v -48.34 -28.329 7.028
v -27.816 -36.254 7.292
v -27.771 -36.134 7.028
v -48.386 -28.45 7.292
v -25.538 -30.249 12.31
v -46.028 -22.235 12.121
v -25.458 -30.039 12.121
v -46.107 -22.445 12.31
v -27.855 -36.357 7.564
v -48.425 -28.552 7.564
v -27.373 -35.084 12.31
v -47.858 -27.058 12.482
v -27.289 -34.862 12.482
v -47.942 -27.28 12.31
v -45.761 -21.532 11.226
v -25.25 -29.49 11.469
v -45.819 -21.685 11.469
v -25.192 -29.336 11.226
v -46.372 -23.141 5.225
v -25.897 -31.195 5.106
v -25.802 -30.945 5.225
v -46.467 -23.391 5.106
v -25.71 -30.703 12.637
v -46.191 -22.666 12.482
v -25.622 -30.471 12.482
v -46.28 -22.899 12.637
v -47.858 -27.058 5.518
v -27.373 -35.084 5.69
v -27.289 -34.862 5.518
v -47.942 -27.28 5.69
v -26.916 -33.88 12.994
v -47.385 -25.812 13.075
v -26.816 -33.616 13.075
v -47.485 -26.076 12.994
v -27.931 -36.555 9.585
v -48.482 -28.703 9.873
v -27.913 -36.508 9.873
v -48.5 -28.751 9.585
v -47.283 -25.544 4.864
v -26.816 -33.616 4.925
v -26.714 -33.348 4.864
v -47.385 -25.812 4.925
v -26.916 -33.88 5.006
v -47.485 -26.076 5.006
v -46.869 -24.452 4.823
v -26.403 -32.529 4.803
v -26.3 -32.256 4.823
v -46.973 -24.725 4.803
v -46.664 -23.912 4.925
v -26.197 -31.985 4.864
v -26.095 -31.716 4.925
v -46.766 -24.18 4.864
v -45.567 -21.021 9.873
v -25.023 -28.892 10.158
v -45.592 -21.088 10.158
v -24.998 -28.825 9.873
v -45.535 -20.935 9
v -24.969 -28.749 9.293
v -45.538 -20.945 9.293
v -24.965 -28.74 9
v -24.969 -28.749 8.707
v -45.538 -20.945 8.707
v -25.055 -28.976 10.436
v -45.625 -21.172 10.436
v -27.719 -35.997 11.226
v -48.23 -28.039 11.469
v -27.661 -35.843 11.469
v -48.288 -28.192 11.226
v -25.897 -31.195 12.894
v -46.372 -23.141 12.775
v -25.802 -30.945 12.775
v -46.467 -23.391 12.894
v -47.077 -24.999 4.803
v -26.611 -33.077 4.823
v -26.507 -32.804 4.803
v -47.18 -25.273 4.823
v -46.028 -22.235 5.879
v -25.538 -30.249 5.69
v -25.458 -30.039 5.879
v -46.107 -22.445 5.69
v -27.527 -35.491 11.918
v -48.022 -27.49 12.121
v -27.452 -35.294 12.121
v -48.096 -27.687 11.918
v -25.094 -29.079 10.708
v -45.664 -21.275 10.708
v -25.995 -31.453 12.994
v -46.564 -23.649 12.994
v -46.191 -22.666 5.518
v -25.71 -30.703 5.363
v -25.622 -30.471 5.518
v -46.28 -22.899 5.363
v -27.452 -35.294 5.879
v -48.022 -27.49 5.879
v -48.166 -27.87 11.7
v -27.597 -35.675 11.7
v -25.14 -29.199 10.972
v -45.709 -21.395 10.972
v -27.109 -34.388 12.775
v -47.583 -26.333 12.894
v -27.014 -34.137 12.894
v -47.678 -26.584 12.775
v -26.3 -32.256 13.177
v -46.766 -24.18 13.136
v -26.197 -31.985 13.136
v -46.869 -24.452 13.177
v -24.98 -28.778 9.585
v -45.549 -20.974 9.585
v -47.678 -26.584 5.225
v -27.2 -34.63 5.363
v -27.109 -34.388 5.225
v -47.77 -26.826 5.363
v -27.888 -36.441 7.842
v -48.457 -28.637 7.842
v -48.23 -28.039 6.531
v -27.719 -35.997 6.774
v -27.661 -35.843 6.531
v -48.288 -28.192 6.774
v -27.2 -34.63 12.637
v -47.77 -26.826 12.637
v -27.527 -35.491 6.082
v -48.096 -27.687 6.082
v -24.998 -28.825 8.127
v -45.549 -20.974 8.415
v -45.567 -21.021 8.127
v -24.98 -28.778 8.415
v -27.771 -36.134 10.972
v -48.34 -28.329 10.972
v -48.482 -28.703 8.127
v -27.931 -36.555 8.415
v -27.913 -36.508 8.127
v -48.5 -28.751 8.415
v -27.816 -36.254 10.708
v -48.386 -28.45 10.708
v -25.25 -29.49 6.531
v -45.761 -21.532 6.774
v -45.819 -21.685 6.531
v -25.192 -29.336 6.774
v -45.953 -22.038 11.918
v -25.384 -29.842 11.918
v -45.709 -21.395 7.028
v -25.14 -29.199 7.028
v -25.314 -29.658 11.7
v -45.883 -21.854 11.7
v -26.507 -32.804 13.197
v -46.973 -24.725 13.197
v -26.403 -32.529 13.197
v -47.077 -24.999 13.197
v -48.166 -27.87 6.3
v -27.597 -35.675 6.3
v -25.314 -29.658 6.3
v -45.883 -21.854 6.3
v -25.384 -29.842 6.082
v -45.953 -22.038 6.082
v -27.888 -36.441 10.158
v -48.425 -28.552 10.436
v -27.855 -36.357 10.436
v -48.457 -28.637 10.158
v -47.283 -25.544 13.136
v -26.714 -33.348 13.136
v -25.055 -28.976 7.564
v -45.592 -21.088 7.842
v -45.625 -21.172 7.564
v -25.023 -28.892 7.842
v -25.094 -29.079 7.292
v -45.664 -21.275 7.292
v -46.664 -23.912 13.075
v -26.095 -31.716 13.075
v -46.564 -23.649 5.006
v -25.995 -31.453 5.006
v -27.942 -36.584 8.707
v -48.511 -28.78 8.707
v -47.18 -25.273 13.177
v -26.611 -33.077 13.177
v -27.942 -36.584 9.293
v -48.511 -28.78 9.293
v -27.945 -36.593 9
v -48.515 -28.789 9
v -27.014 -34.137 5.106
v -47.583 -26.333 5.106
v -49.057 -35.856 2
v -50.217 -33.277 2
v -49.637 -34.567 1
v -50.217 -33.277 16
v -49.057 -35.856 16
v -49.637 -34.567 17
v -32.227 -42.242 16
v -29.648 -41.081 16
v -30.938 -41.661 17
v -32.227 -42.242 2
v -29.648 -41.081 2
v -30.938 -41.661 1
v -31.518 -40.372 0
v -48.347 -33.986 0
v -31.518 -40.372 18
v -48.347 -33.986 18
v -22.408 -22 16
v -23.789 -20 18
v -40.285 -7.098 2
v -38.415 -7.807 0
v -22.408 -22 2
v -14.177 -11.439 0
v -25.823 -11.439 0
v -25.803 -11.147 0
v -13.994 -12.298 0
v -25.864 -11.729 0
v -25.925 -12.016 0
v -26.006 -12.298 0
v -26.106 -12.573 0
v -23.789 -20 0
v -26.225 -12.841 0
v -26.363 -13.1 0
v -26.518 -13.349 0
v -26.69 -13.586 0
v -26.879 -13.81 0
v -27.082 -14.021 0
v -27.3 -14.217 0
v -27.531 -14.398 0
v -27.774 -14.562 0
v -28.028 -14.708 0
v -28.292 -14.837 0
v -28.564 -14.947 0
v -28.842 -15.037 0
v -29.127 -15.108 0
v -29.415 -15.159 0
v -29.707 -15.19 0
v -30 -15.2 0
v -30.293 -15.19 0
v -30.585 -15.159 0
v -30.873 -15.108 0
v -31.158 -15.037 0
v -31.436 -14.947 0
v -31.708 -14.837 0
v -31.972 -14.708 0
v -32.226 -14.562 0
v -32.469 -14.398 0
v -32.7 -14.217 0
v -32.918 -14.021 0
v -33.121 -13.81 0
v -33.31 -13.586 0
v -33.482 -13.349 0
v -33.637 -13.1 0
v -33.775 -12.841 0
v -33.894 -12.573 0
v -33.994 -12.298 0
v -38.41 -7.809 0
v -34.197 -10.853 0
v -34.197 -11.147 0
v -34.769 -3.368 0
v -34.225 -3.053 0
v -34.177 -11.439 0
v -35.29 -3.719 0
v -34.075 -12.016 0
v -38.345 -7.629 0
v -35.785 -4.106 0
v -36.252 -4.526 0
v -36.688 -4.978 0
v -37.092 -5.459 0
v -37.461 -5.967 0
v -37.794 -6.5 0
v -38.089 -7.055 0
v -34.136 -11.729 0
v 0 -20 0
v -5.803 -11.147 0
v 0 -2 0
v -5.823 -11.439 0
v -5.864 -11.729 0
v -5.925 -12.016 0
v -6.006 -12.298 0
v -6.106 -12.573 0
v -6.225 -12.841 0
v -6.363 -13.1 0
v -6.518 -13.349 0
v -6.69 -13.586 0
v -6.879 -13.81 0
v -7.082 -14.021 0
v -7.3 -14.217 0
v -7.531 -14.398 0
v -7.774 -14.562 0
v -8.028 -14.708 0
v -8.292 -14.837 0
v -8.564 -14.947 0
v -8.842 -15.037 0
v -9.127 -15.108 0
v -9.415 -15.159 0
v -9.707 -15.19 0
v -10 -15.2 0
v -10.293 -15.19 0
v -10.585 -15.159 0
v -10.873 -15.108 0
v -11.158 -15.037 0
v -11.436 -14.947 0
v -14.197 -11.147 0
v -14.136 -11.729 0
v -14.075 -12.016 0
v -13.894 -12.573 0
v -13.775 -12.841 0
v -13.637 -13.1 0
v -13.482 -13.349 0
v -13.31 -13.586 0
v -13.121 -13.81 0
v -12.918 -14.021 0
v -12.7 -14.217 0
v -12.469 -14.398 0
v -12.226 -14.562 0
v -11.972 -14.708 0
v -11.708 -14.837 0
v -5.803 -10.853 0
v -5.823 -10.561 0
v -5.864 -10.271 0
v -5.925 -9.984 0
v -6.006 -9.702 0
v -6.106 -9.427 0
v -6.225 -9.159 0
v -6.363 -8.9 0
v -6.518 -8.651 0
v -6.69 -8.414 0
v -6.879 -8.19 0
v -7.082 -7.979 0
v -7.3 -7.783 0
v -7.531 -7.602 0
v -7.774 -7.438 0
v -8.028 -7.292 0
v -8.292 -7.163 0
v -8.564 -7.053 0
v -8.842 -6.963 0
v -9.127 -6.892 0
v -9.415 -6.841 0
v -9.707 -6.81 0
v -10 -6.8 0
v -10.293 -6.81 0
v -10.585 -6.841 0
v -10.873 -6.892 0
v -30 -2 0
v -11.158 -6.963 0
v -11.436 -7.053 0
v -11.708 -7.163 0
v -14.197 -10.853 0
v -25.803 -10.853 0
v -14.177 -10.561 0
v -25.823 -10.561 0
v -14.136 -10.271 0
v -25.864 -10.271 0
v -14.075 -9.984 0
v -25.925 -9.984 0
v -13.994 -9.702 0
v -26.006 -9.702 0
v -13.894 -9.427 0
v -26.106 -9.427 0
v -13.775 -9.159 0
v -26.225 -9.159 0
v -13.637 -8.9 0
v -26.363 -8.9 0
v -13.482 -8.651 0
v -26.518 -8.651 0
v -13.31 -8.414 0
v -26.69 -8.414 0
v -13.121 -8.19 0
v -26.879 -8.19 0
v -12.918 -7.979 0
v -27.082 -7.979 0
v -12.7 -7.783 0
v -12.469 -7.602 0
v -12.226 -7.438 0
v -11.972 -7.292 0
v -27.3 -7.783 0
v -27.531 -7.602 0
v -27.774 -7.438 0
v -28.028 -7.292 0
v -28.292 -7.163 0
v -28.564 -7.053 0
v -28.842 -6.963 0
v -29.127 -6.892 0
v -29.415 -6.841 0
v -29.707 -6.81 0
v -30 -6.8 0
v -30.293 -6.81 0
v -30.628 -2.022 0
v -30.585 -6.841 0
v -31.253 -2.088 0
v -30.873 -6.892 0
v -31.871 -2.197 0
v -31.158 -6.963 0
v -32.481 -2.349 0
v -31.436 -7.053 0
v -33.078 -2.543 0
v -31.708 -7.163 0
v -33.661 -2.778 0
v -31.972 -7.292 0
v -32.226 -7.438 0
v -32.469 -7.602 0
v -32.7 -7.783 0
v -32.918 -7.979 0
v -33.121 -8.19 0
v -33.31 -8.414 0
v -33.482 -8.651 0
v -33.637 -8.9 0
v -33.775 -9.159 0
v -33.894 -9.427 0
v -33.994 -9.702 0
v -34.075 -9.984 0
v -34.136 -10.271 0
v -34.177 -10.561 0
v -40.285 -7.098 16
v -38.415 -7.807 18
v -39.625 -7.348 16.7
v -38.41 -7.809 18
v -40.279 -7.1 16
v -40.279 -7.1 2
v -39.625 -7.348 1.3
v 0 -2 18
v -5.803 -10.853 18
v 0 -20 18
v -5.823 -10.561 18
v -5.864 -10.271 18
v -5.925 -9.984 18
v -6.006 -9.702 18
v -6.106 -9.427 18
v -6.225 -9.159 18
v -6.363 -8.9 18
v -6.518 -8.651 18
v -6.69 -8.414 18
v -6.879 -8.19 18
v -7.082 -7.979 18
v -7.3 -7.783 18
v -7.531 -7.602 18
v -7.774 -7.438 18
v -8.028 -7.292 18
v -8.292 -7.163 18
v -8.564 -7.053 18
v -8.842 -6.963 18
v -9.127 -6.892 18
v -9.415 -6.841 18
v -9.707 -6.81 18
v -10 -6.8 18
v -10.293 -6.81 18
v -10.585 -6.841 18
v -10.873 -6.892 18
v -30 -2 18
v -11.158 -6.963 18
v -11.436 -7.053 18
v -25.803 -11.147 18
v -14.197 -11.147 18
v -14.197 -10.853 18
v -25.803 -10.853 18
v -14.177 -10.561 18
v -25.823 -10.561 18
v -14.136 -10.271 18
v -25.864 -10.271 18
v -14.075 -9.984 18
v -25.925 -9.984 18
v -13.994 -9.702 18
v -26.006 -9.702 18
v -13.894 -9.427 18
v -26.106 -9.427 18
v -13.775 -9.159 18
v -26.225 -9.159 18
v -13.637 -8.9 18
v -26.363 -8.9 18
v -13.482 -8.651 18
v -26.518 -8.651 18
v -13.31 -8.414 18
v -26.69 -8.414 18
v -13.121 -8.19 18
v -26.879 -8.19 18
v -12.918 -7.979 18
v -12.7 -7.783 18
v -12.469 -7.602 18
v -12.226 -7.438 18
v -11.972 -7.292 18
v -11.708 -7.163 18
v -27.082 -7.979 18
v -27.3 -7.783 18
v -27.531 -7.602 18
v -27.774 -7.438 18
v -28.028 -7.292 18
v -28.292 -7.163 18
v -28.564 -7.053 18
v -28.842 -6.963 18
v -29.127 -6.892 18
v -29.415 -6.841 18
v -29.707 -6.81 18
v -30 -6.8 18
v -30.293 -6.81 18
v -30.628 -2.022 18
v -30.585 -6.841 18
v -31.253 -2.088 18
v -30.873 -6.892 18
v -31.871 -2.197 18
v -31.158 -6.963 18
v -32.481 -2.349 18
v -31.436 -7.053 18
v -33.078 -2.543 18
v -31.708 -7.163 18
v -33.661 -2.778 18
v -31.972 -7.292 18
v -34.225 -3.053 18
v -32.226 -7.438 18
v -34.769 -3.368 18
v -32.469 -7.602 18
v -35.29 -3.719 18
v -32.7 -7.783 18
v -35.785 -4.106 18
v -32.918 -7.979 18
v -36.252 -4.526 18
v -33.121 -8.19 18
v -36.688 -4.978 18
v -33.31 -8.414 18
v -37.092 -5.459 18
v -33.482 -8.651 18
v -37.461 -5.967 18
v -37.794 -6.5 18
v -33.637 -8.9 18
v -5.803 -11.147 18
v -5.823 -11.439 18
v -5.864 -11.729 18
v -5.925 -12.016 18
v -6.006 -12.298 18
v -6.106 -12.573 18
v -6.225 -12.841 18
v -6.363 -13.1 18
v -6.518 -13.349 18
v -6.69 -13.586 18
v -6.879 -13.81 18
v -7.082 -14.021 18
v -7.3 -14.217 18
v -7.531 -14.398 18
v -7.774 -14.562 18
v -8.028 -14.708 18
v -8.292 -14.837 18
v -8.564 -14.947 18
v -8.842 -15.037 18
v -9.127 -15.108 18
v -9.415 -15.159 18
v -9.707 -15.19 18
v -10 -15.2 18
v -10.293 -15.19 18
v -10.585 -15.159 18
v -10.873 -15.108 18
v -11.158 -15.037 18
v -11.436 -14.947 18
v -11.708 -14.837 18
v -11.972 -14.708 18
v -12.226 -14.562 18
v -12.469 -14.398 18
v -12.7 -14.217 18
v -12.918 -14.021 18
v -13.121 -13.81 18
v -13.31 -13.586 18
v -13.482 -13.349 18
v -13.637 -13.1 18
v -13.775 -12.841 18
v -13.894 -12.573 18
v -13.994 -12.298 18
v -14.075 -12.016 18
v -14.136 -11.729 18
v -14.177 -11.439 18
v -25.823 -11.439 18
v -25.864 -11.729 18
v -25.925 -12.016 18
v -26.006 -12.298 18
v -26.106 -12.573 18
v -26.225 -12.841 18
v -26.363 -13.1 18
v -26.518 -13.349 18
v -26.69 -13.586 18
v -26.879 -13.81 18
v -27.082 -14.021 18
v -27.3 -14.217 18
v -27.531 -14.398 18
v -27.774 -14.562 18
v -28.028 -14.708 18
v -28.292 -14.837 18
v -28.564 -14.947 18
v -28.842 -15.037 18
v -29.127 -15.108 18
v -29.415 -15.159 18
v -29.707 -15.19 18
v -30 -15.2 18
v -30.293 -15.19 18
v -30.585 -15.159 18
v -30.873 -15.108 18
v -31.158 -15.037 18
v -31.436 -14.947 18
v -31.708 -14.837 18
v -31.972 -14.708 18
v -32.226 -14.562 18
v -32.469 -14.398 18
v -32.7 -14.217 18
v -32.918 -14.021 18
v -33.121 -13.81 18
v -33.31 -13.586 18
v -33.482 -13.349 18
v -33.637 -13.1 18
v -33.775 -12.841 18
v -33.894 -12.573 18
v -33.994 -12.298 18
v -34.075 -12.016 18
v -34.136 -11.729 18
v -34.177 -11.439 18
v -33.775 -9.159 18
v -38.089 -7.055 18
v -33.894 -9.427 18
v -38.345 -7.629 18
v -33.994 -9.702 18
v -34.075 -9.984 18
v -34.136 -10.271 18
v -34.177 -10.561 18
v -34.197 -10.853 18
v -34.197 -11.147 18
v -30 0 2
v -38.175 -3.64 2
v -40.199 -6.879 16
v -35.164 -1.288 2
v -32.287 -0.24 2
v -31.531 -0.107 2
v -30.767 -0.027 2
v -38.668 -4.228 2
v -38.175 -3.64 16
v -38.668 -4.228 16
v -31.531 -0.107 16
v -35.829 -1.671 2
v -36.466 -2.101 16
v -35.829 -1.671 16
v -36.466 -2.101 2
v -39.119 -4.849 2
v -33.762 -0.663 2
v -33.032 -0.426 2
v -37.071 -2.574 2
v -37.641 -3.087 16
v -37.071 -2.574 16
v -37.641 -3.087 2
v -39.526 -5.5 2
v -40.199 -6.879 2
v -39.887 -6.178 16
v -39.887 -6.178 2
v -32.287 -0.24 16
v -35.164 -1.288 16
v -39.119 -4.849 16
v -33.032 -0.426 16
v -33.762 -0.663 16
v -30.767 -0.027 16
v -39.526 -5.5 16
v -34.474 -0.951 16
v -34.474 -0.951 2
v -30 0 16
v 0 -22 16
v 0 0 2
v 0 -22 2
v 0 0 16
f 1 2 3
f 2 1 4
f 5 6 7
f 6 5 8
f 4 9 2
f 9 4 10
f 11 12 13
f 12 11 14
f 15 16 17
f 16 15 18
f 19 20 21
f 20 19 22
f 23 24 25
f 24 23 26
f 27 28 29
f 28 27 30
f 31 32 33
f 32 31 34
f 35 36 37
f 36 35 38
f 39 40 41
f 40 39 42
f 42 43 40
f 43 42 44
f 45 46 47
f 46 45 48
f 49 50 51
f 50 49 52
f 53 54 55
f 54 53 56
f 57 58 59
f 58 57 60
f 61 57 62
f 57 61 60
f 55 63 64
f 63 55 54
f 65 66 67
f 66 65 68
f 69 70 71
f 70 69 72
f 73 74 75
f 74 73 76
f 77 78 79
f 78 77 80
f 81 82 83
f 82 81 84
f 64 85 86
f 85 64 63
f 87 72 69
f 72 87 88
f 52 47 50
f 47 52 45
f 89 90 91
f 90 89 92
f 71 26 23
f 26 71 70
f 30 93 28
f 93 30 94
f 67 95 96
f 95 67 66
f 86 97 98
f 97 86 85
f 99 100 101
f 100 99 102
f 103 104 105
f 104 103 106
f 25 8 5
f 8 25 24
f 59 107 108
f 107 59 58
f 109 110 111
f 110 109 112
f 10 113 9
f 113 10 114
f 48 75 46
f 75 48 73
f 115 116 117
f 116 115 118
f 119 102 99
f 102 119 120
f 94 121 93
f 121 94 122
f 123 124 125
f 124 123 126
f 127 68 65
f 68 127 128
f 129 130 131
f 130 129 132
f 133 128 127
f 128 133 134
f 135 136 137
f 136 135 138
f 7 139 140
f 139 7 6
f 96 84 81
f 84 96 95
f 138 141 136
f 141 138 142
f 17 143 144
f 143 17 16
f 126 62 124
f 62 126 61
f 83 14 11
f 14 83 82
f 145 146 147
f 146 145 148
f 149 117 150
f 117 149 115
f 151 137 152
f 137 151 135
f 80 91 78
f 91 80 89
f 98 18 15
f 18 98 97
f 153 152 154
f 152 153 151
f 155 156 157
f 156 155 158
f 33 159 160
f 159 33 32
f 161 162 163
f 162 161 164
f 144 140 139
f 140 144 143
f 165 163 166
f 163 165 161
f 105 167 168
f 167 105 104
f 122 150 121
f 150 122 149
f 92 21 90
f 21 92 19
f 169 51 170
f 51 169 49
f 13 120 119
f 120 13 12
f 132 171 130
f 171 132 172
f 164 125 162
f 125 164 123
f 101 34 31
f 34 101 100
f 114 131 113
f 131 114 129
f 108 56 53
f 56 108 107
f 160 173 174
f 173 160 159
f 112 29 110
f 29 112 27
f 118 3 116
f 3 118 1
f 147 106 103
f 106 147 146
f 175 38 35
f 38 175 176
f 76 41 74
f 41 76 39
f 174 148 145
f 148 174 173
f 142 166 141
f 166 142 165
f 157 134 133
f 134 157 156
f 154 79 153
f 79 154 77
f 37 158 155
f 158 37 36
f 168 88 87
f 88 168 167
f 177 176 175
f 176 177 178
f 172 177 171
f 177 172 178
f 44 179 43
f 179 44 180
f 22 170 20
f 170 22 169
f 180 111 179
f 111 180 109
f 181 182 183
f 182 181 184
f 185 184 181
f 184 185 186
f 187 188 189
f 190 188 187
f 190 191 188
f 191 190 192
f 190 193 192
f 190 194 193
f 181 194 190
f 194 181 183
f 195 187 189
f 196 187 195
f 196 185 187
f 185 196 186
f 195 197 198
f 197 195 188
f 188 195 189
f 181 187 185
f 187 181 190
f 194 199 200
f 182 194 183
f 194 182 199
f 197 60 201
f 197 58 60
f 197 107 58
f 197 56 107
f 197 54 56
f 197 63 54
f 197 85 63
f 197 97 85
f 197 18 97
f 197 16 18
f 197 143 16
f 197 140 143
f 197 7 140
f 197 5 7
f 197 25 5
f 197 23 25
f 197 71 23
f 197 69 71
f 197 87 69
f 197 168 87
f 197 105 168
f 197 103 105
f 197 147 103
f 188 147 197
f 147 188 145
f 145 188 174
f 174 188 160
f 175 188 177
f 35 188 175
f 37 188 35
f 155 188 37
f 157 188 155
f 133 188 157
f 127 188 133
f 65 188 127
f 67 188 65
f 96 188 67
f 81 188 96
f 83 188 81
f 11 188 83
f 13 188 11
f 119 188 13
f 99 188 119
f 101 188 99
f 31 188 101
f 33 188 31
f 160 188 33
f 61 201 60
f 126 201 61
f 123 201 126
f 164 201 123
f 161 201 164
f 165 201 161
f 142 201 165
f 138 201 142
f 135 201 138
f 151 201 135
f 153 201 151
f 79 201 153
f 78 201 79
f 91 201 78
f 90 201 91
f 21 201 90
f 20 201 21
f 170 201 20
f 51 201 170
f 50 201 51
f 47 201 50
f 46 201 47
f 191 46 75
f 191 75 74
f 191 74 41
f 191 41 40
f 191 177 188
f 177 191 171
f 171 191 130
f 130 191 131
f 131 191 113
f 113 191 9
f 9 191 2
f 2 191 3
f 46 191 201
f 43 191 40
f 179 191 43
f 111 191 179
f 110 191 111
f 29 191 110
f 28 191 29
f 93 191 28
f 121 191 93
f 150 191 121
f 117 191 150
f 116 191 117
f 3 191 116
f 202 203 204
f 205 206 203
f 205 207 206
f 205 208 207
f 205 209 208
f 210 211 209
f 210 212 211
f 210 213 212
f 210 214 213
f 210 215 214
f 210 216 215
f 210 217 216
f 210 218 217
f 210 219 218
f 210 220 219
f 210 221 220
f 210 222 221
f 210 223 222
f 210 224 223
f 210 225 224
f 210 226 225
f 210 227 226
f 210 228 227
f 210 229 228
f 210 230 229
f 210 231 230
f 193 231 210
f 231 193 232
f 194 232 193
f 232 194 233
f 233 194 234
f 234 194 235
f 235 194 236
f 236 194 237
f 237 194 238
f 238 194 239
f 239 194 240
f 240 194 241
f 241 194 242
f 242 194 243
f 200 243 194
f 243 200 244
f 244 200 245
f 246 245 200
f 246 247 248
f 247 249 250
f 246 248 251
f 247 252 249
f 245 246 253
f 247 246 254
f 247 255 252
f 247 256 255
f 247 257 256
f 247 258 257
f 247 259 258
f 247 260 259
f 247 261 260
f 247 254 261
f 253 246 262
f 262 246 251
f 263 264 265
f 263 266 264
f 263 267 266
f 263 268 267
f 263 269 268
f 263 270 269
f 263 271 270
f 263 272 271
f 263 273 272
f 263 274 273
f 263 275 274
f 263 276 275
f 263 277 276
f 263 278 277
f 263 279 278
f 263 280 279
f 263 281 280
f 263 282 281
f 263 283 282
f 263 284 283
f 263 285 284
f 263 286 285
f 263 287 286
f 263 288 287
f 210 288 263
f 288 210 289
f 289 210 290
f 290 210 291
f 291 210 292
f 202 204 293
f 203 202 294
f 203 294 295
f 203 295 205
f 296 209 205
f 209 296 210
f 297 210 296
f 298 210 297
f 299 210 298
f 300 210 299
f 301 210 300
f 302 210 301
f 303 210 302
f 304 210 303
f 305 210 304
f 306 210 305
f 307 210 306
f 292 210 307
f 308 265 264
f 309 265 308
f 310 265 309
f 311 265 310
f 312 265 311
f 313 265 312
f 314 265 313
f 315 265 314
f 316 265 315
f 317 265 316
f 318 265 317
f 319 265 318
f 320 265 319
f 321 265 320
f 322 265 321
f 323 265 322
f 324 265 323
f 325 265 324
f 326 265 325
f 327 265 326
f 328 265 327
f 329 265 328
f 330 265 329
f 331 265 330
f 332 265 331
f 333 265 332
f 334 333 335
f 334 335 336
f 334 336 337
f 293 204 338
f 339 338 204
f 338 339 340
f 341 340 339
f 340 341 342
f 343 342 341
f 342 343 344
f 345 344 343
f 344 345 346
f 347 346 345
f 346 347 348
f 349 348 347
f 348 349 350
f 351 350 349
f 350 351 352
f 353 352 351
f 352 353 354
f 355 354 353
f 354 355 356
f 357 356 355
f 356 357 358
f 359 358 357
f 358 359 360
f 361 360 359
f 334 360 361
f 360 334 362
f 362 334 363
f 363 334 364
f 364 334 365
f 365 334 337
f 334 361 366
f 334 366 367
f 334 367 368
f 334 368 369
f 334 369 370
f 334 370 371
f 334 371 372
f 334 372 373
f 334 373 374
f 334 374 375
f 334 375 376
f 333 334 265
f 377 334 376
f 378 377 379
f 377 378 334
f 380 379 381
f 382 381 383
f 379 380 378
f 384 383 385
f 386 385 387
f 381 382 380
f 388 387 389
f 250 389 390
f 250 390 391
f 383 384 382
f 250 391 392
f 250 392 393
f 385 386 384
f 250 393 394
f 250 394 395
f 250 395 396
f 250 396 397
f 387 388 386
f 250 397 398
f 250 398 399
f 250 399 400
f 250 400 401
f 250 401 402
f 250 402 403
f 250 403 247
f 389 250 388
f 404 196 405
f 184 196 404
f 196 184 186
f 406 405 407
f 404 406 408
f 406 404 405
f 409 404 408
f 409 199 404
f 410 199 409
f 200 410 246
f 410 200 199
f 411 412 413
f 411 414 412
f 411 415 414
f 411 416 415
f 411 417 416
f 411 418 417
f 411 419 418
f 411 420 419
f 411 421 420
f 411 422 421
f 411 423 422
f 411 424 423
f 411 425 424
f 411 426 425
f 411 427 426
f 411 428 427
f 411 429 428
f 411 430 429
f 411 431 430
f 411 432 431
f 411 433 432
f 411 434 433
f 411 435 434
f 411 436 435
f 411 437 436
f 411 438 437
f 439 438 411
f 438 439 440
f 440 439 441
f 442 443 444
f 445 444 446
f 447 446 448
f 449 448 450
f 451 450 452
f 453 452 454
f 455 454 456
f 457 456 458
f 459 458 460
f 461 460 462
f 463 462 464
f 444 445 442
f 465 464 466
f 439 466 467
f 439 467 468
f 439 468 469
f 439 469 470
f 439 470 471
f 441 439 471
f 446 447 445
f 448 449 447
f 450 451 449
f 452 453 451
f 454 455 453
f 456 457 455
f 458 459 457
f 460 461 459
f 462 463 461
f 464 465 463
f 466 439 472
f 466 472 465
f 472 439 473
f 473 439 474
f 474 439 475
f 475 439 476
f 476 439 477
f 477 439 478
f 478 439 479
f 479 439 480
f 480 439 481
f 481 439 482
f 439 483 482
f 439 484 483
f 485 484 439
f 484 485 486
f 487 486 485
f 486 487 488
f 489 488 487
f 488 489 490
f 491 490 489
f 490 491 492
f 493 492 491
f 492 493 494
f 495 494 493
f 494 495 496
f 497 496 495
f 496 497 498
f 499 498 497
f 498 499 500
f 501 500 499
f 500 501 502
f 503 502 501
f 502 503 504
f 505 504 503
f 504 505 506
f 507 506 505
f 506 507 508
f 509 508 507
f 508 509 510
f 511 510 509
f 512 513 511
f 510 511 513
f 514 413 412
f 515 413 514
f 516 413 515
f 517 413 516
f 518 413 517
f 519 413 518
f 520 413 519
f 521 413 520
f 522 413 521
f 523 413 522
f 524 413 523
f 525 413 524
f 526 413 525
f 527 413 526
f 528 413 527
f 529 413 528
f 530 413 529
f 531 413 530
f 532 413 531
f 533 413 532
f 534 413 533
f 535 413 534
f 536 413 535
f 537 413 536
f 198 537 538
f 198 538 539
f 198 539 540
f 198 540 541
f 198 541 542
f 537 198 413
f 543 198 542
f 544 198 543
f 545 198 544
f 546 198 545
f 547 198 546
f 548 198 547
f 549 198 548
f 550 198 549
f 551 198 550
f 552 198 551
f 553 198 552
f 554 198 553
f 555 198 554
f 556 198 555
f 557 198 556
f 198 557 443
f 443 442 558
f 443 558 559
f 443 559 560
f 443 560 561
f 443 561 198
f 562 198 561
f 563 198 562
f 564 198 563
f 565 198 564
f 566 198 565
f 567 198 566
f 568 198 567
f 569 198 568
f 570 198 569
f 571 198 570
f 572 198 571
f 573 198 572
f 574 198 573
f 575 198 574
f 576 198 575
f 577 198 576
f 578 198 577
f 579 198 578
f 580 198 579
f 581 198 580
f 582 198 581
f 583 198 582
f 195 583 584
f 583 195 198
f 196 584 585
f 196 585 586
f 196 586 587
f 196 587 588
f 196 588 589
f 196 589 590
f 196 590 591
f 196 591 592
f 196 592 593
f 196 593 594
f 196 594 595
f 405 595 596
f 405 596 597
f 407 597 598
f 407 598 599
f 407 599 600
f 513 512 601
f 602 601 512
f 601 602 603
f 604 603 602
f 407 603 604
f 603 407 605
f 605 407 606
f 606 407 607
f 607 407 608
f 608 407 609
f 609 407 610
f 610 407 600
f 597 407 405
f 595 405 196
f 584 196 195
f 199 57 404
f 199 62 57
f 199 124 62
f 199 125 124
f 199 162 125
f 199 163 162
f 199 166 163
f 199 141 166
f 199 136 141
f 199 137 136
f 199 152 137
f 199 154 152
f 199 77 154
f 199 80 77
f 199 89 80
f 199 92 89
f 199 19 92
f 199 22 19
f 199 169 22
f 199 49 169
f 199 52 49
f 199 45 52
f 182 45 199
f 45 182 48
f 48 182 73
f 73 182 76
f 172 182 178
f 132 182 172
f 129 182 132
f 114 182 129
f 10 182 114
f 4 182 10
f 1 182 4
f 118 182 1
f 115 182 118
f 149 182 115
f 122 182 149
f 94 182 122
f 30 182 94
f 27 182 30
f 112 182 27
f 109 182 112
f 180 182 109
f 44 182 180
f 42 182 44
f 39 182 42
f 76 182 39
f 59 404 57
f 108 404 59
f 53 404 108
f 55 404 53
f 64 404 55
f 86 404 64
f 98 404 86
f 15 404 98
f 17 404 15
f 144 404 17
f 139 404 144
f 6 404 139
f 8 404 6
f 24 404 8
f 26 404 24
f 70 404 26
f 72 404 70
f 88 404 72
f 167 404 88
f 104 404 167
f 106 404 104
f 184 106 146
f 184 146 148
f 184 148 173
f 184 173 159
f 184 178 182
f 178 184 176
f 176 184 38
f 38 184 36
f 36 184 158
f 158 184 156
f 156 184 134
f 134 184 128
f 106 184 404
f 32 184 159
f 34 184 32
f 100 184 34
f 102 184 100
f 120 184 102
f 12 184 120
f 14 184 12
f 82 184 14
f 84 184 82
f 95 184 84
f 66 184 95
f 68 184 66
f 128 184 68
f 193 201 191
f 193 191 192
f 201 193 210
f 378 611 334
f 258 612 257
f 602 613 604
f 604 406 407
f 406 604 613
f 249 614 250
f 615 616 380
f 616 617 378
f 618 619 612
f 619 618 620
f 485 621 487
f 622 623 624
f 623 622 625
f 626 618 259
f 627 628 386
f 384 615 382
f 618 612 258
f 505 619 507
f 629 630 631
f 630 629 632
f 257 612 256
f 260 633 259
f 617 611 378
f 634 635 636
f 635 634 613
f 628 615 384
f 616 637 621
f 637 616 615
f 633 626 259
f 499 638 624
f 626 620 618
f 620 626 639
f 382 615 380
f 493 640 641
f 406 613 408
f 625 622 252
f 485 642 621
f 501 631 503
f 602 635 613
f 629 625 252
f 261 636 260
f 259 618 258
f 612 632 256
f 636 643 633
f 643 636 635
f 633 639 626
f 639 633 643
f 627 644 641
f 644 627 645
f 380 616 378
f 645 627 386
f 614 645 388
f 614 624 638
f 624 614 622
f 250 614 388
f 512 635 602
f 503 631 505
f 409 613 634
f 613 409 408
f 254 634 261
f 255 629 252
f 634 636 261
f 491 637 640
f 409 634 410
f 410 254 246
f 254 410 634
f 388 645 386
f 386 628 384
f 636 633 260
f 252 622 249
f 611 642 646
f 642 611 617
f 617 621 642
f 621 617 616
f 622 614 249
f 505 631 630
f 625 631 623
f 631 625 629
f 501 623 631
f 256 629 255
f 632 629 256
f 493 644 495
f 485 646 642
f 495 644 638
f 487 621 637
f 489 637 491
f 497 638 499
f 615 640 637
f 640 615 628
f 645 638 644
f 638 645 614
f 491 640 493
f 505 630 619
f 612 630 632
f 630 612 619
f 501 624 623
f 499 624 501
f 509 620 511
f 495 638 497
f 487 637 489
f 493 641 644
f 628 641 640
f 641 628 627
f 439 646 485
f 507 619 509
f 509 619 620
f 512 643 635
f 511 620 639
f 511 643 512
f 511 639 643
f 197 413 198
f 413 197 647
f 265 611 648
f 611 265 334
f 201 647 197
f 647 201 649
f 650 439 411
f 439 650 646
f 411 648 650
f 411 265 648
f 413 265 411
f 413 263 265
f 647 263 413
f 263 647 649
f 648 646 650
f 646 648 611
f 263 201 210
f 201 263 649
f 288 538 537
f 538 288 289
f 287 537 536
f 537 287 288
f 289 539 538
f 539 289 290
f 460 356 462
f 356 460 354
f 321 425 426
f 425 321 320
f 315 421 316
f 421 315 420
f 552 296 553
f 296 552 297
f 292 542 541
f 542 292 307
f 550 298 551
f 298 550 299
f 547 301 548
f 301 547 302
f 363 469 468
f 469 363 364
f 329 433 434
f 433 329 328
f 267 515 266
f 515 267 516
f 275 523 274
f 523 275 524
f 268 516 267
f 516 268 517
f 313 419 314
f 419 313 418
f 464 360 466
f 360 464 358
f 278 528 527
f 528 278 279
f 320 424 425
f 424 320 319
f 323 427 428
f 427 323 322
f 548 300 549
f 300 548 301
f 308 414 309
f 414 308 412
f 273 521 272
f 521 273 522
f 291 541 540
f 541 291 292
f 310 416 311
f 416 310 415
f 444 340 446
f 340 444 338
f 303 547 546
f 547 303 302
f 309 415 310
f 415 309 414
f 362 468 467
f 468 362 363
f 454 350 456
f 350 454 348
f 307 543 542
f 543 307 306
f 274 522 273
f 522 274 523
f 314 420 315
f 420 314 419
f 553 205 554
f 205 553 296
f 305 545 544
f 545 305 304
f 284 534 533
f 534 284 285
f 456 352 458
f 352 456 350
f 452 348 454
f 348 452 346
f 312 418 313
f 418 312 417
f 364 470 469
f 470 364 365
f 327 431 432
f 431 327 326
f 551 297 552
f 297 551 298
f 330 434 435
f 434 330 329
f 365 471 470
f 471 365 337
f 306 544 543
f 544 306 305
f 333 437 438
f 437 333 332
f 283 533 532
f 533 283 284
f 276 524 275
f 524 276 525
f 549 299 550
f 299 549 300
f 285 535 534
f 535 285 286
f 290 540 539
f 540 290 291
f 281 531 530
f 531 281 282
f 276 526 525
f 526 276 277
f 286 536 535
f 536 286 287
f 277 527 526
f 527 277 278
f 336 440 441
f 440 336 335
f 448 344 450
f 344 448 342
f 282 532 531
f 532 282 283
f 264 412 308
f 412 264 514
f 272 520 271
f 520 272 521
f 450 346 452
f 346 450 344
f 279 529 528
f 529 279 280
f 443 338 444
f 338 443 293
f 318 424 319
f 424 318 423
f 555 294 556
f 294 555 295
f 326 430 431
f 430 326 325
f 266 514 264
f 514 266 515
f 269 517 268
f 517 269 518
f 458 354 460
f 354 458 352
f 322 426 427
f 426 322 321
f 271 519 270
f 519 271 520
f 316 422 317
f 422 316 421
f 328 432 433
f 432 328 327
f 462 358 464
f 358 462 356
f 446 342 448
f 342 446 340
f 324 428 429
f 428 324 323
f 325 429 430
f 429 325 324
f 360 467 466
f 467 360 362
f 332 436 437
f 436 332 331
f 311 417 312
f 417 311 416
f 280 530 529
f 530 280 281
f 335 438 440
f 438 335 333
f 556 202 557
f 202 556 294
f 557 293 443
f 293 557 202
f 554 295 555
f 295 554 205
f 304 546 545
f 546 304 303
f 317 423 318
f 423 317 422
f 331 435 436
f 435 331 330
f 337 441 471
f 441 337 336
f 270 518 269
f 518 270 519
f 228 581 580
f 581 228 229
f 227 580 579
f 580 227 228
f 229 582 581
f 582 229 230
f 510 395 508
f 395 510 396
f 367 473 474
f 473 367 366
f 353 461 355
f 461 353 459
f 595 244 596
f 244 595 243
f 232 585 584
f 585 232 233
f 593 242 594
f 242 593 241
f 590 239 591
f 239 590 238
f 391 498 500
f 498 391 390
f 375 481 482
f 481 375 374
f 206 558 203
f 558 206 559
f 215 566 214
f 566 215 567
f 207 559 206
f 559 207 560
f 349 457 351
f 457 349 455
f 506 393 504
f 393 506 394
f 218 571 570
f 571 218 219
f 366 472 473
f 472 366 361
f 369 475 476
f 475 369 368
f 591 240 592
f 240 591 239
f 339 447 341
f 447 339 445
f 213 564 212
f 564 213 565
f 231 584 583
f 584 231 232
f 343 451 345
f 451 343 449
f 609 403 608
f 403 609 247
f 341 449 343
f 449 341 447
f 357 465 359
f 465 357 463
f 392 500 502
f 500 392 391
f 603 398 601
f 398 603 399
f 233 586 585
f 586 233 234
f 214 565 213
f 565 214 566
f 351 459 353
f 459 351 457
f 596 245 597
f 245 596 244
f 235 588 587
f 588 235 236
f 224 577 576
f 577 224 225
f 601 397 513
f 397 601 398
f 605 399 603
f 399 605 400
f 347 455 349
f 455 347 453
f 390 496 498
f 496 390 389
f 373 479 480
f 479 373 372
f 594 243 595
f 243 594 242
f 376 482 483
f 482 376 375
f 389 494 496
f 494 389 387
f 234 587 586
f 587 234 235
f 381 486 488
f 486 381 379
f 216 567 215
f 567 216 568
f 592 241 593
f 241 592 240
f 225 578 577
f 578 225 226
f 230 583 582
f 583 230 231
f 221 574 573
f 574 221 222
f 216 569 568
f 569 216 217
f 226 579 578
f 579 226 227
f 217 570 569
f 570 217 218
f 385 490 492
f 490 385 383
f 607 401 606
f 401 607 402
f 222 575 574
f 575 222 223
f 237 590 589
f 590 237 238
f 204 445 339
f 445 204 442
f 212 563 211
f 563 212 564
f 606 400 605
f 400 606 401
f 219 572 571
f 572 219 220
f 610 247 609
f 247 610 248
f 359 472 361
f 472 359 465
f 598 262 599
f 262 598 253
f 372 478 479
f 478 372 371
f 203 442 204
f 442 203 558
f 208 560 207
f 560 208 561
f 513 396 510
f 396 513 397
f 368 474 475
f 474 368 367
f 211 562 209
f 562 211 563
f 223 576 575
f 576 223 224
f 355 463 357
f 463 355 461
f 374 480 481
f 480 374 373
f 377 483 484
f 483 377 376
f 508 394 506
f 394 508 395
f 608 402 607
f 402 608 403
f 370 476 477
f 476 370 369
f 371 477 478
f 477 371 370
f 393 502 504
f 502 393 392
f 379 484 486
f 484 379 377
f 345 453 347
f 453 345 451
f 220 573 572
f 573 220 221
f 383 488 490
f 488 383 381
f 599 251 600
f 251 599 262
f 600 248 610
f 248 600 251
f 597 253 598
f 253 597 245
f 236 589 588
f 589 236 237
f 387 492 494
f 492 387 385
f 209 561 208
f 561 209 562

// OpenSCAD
//Supports for Prusa i3 printer.
//By Jkk79.

//
showAssembly=0;//[1:Yes,0:No]
//
part="leg";//[top:Top holder part,leg:Leg part]

//distance between the aluminium frame and the center of the threaded rods at the end of the Y-axis. Mine is 119mm. Adjust this if yours is something else.
frameDistance=119;
//The diameter of the new threaded support rods, M8 default. You can use a smaller one, larger won't fit, and even M5 would be strong enough.
supportRodDiameter=8;
/*[Leg part]*/
//Cut edges off of the leg part. 0=no cuts, no overhang at corners, easier to print.
legChamfer=2;//[0,1,2,3,4]
/*[Top part]*/
//The thickness of the top holder part. You need to replace the M3 screws with at least this much longer M3 screws.
topHolderThickness=6;
//Cut the top holder corners, 0=no cut.
topHolderCorners=5;
//The alignment the top holder should be printed at. Notice: bottom will be cut differently and different parts are at right angle to the print bed.
topHolderPrintAlign=1;//[1:Upside down,2:Right way up]
//The height of the top holder part.  Set to at least 18 if printing the holder right way up to avoid M8 washer intersecting with M3 nut. Also if your Y-axis's end is considerably farther off from the frame than the default, you may need to increase the value.
topHolderHeight=16;//[16:22]

//Adjust if you think you need to.
washerCutDepth=7;//[5:11]


/*[Settings you shouldn't need to change]*/
//The diameter of the threaded rods at the end of the Y-axis. M8 default, so 8mm. You need to swap these to ones that are 370mm long.
yEndRodDiameter=8;
//the width of the leg part.
legWidth=22;
//The thickness of the leg part.
legThickness=18;
//The lower Y-axis end rod center distance from ground.
holeDistance1=10;
//The upper Y-axis end rod center distance from ground.
holeDistance2=30;
//Height of the frame, should be 370mm.
frameHeight=370;
//Screw size. default is M3.
topHolderScrewSize=3;


/*[Hidden]*/
$fn=90;
//The width of the top holder part. 40. For now changing this only breaks things.
topHolderWidth=40;
//Calculated angle of the new support rod.
angle=atan2(frameHeight-holeDistance2,frameDistance+holeDistance2-holeDistance1-10);
//Calculated length of the new support rod.
supportRodLength=sqrt(pow(frameHeight-holeDistance2,2)+pow(frameDistance+holeDistance2-holeDistance1-10,2))+legWidth;
//convexity setting, just so it's easier to switch. 
conv=8;

echo("The angle of the rods: ",angle);
echo("The new support rods need to be at least ",supportRodLength,"mm long");
echo("would be nice to get an echo support for customizer.");
print_part();




if(showAssembly==1){  
   translate([-60,-185,0])%assembly();
}else{}


module print_part(){
    if(part=="top"){
        if(topHolderPrintAlign==1){
            translate([0,0,topHolderHeight])rotate([0,180,0])topHolder();//align 1
        }
        else{
            translate([0,40,0])rotate([0,90-angle,180])topHolder(); //align 2
        }
    }
    else if(part=="leg"){
        rotate([90,0,-90])leg();
    }
}




module leg(){

    difference(){
        union(){
            translate([legWidth/2,legThickness,holeDistance2])rotate([90,0,0])legBend();
            legPart();
            translate([legWidth/2,0,holeDistance2])rotate([0,angle,0]){
                translate([-legWidth/2,0,legWidth/2-legWidth/2]){
                    difference(){
                        legPart();
                        translate([0,0,-legWidth/2]){
                        translate([-1,legThickness/2,holeDistance2])rotate([0,90,0])cylinder(legWidth+2,supportRodDiameter/2+0.2,supportRodDiameter/2+0.2);
                        translate([0,0,holeDistance2+legWidth/2-legChamfer])rotate([0,-45,0])cube([legChamfer*2,20,legChamfer*2]);
                        translate([legWidth,0,holeDistance2+legWidth/2-legChamfer])rotate([0,-45,0])cube([legChamfer*2,20,legChamfer*2]);
                        translate([0,0,holeDistance2+legWidth/2-legChamfer])rotate([45,0,0])cube([legWidth,legChamfer*2,legChamfer*2]);
                        translate([0,legThickness,holeDistance2+legWidth/2-legChamfer])rotate([45,0,0])cube([legWidth,legChamfer*2,legChamfer*2]);
                        }
                    }
                }
            }
        }
        translate([legWidth/2,legThickness+1,holeDistance1])rotate([90,0,0])cylinder(legThickness+2,yEndRodDiameter/2+0.2,yEndRodDiameter/2+0.2);
        translate([legWidth/2,legThickness+1,holeDistance2])rotate([90,0,0])cylinder(legThickness+2,yEndRodDiameter/2+0.2,yEndRodDiameter/2+0.2);
    }
    //translate([legWidth,20,30-tan(angle/2)*legWidth/2])rotate([90,0,0])cylinder(30,2,2); //inner bend intersection.
}

module legPart(){
    linear_extrude(height=holeDistance2,convexity=conv)polygon(points=[[legChamfer,0],[legWidth-legChamfer,0],[legWidth,legChamfer],[legWidth,legThickness-legChamfer],[legWidth-legChamfer,legThickness],[legChamfer,legThickness],[0,legThickness-legChamfer],[0,legChamfer]]);
}
    
module legBend(){    
    difference(){
        rotate_extrude(convexity=conv)polygon(points=[[0,0],[(legWidth/2)-legChamfer,0],[legWidth/2,legChamfer],[legWidth/2,legThickness-legChamfer],[legWidth/2-legChamfer,legThickness],[0,legThickness]]);
    }
}


module topHolder(){

    union(){
        difference(){
            union(){
                //hull(){
                    difference(){
                        cube([topHolderThickness,topHolderWidth,topHolderHeight]);
                        translate([-1,0,topHolderHeight-topHolderCorners])rotate([45,0,0])cube([20,20,20]);   
                        translate([0,topHolderWidth,0])mirror([0,1,0])translate([-1,0,topHolderHeight-topHolderCorners])rotate([45,0,0])cube([20,20,20]);   

            }
                    translate([0,20,topHolderHeight])mirror([0,0,1])hull(){
                    rotate([0,90-angle,0])translate([10,0,0])cylinder(25,10,10);
                    rotate([0,0,0])translate([0,0,0])cylinder(25,10,10);
                    }
               // }//hull
            }
            translate([0,20,topHolderHeight])mirror([0,0,1])rotate([0,90-angle,0])translate([10,0,-5])cylinder(30,supportRodDiameter/2+0.2,supportRodDiameter/2+0.2);             
            translate([0,20,topHolderHeight])mirror([0,0,1])rotate([0,90-angle,0])translate([10,0,0])cylinder(washerCutDepth,9.2,9.2);
                
            translate([-1,10,topHolderHeight-10])rotate([0,90,0])cylinder(20,topHolderScrewSize/2+0.2,topHolderScrewSize/2+0.2);
            translate([-1,30,topHolderHeight-10])rotate([0,90,0])cylinder(20,topHolderScrewSize/2+0.2,topHolderScrewSize/2+0.2);
            hull(){
                translate([topHolderThickness,10,topHolderHeight-10])rotate([0,90,0])cylinder(20,topHolderScrewSize+1.5,topHolderScrewSize+1.5);
                translate([topHolderThickness,10,0])rotate([0,90,0])cylinder(20,topHolderScrewSize+1.5,topHolderScrewSize+1.5);
                translate([topHolderThickness,0,topHolderHeight-10])rotate([0,90,0])cylinder(20,topHolderScrewSize+1.5,topHolderScrewSize+1.5);
                translate([topHolderThickness,0,0])rotate([0,90,0])cylinder(20,topHolderScrewSize+1.5,topHolderScrewSize+1.5);
                
            }
            hull(){
                translate([topHolderThickness,30,topHolderHeight-10])rotate([0,90,0])cylinder(20,topHolderScrewSize+1.5,topHolderScrewSize+1.5);
                translate([topHolderThickness,30,0])rotate([0,90,0])cylinder(20,topHolderScrewSize+1.5,topHolderScrewSize+1.5);
                translate([topHolderThickness,40,topHolderHeight-10])rotate([0,90,0])cylinder(20,topHolderScrewSize+1.5,topHolderScrewSize+1.5);
                translate([topHolderThickness,40,0])rotate([0,90,0])cylinder(20,topHolderScrewSize+1.5,topHolderScrewSize+1.5);
            }
           
           if(topHolderPrintAlign==1){
               translate([topHolderThickness,-1,0])rotate([0,-90+angle,0])mirror([0,0,1])cube([40,topHolderWidth+2,40]);//bottom cutter
              translate([-1,0,-20])rotate([0,0,0])cube([40,topHolderWidth,20]);//bottom cutter 2
            }
            else{
               translate([0,-1,0])rotate([0,-90+angle,0])mirror([0,0,1])translate([-5,0,0])cube([40,topHolderWidth+2,40]); //alternative bottom cutter
            }

            translate([-10,0,topHolderHeight])rotate([0,0,0])cube([40,40,20]);//top cutter
            
            translate([-40,0,-20])rotate([0,0,0])cube([40,40,60]);//back cutter
            

        }
    }
}


module assembly(){
    color("lime")translate([0,0,frameHeight-topHolderHeight])rotate([0,0,0])topHolder();
    color("lime")translate([0,370-topHolderWidth,frameHeight-topHolderHeight])rotate([0,0,0])topHolder();
    color("lime")translate([frameDistance-legWidth/2,topHolderWidth/2-legThickness/2,0])rotate([0,0,0])leg(); 
    color("lime")translate([frameDistance-legWidth/2,370-topHolderWidth/2-legThickness/2,0])rotate([0,0,0])leg();

    %difference(){
        translate([-6,0,0])cube([6,370,frameHeight]);
        translate([-7,55,35])cube([8,370-55-55,frameHeight-40-35]);
        }
    color("yellow")translate([0,topHolderWidth/2,frameHeight])mirror([0,0,0])rotate([0,90+angle,0])translate([-10,0,0])cylinder(supportRodLength,supportRodDiameter/2 ,supportRodDiameter/2);
    color("yellow")translate([0,370-topHolderWidth/2,frameHeight])mirror([0,0,0])rotate([0,90+angle,0])translate([-10,0,0])cylinder(supportRodLength,4,4); //m8 rod
    color("khaki")translate([frameDistance,0,holeDistance1])rotate([-90,0,0])cylinder(370,yEndRodDiameter/2,yEndRodDiameter/2);
    color("khaki")translate([frameDistance,0,holeDistance2])rotate([-90,0,0])cylinder(370,yEndRodDiameter/2,yEndRodDiameter/2);
    %translate([frameDistance-legWidth/2,100-legThickness/2,0])cube([legWidth,legThickness,50]);
    %translate([frameDistance-legWidth/2,370-100-legThickness/2,0])cube([legWidth,legThickness,50]);
    
    %translate([frameDistance-335-legWidth/2,100-legThickness/2,0])cube([legWidth,legThickness,50]);
    %translate([frameDistance-335-legWidth/2,370-100-legThickness/2,0])cube([legWidth,legThickness,50]);
    %translate([frameDistance-335,82.5,holeDistance1])rotate([-90,0,0])cylinder(205,4,4);
    %translate([frameDistance-335,82.5,holeDistance2])rotate([-90,0,0])cylinder(205,4,4);
        
    %translate([frameDistance+21,100,holeDistance2-holeDistance1])rotate([0,-90,0])cylinder(380,5,5);
    %translate([frameDistance+21,370-100,holeDistance2-holeDistance1])rotate([0,-90,0])cylinder(380,5,5);
        
    %translate([frameDistance+8,100,48])rotate([0,-90,0])cylinder(350,4,4);
    %translate([frameDistance+8,370-100,48])rotate([0,-90,0])cylinder(350,4,4);
        
}


